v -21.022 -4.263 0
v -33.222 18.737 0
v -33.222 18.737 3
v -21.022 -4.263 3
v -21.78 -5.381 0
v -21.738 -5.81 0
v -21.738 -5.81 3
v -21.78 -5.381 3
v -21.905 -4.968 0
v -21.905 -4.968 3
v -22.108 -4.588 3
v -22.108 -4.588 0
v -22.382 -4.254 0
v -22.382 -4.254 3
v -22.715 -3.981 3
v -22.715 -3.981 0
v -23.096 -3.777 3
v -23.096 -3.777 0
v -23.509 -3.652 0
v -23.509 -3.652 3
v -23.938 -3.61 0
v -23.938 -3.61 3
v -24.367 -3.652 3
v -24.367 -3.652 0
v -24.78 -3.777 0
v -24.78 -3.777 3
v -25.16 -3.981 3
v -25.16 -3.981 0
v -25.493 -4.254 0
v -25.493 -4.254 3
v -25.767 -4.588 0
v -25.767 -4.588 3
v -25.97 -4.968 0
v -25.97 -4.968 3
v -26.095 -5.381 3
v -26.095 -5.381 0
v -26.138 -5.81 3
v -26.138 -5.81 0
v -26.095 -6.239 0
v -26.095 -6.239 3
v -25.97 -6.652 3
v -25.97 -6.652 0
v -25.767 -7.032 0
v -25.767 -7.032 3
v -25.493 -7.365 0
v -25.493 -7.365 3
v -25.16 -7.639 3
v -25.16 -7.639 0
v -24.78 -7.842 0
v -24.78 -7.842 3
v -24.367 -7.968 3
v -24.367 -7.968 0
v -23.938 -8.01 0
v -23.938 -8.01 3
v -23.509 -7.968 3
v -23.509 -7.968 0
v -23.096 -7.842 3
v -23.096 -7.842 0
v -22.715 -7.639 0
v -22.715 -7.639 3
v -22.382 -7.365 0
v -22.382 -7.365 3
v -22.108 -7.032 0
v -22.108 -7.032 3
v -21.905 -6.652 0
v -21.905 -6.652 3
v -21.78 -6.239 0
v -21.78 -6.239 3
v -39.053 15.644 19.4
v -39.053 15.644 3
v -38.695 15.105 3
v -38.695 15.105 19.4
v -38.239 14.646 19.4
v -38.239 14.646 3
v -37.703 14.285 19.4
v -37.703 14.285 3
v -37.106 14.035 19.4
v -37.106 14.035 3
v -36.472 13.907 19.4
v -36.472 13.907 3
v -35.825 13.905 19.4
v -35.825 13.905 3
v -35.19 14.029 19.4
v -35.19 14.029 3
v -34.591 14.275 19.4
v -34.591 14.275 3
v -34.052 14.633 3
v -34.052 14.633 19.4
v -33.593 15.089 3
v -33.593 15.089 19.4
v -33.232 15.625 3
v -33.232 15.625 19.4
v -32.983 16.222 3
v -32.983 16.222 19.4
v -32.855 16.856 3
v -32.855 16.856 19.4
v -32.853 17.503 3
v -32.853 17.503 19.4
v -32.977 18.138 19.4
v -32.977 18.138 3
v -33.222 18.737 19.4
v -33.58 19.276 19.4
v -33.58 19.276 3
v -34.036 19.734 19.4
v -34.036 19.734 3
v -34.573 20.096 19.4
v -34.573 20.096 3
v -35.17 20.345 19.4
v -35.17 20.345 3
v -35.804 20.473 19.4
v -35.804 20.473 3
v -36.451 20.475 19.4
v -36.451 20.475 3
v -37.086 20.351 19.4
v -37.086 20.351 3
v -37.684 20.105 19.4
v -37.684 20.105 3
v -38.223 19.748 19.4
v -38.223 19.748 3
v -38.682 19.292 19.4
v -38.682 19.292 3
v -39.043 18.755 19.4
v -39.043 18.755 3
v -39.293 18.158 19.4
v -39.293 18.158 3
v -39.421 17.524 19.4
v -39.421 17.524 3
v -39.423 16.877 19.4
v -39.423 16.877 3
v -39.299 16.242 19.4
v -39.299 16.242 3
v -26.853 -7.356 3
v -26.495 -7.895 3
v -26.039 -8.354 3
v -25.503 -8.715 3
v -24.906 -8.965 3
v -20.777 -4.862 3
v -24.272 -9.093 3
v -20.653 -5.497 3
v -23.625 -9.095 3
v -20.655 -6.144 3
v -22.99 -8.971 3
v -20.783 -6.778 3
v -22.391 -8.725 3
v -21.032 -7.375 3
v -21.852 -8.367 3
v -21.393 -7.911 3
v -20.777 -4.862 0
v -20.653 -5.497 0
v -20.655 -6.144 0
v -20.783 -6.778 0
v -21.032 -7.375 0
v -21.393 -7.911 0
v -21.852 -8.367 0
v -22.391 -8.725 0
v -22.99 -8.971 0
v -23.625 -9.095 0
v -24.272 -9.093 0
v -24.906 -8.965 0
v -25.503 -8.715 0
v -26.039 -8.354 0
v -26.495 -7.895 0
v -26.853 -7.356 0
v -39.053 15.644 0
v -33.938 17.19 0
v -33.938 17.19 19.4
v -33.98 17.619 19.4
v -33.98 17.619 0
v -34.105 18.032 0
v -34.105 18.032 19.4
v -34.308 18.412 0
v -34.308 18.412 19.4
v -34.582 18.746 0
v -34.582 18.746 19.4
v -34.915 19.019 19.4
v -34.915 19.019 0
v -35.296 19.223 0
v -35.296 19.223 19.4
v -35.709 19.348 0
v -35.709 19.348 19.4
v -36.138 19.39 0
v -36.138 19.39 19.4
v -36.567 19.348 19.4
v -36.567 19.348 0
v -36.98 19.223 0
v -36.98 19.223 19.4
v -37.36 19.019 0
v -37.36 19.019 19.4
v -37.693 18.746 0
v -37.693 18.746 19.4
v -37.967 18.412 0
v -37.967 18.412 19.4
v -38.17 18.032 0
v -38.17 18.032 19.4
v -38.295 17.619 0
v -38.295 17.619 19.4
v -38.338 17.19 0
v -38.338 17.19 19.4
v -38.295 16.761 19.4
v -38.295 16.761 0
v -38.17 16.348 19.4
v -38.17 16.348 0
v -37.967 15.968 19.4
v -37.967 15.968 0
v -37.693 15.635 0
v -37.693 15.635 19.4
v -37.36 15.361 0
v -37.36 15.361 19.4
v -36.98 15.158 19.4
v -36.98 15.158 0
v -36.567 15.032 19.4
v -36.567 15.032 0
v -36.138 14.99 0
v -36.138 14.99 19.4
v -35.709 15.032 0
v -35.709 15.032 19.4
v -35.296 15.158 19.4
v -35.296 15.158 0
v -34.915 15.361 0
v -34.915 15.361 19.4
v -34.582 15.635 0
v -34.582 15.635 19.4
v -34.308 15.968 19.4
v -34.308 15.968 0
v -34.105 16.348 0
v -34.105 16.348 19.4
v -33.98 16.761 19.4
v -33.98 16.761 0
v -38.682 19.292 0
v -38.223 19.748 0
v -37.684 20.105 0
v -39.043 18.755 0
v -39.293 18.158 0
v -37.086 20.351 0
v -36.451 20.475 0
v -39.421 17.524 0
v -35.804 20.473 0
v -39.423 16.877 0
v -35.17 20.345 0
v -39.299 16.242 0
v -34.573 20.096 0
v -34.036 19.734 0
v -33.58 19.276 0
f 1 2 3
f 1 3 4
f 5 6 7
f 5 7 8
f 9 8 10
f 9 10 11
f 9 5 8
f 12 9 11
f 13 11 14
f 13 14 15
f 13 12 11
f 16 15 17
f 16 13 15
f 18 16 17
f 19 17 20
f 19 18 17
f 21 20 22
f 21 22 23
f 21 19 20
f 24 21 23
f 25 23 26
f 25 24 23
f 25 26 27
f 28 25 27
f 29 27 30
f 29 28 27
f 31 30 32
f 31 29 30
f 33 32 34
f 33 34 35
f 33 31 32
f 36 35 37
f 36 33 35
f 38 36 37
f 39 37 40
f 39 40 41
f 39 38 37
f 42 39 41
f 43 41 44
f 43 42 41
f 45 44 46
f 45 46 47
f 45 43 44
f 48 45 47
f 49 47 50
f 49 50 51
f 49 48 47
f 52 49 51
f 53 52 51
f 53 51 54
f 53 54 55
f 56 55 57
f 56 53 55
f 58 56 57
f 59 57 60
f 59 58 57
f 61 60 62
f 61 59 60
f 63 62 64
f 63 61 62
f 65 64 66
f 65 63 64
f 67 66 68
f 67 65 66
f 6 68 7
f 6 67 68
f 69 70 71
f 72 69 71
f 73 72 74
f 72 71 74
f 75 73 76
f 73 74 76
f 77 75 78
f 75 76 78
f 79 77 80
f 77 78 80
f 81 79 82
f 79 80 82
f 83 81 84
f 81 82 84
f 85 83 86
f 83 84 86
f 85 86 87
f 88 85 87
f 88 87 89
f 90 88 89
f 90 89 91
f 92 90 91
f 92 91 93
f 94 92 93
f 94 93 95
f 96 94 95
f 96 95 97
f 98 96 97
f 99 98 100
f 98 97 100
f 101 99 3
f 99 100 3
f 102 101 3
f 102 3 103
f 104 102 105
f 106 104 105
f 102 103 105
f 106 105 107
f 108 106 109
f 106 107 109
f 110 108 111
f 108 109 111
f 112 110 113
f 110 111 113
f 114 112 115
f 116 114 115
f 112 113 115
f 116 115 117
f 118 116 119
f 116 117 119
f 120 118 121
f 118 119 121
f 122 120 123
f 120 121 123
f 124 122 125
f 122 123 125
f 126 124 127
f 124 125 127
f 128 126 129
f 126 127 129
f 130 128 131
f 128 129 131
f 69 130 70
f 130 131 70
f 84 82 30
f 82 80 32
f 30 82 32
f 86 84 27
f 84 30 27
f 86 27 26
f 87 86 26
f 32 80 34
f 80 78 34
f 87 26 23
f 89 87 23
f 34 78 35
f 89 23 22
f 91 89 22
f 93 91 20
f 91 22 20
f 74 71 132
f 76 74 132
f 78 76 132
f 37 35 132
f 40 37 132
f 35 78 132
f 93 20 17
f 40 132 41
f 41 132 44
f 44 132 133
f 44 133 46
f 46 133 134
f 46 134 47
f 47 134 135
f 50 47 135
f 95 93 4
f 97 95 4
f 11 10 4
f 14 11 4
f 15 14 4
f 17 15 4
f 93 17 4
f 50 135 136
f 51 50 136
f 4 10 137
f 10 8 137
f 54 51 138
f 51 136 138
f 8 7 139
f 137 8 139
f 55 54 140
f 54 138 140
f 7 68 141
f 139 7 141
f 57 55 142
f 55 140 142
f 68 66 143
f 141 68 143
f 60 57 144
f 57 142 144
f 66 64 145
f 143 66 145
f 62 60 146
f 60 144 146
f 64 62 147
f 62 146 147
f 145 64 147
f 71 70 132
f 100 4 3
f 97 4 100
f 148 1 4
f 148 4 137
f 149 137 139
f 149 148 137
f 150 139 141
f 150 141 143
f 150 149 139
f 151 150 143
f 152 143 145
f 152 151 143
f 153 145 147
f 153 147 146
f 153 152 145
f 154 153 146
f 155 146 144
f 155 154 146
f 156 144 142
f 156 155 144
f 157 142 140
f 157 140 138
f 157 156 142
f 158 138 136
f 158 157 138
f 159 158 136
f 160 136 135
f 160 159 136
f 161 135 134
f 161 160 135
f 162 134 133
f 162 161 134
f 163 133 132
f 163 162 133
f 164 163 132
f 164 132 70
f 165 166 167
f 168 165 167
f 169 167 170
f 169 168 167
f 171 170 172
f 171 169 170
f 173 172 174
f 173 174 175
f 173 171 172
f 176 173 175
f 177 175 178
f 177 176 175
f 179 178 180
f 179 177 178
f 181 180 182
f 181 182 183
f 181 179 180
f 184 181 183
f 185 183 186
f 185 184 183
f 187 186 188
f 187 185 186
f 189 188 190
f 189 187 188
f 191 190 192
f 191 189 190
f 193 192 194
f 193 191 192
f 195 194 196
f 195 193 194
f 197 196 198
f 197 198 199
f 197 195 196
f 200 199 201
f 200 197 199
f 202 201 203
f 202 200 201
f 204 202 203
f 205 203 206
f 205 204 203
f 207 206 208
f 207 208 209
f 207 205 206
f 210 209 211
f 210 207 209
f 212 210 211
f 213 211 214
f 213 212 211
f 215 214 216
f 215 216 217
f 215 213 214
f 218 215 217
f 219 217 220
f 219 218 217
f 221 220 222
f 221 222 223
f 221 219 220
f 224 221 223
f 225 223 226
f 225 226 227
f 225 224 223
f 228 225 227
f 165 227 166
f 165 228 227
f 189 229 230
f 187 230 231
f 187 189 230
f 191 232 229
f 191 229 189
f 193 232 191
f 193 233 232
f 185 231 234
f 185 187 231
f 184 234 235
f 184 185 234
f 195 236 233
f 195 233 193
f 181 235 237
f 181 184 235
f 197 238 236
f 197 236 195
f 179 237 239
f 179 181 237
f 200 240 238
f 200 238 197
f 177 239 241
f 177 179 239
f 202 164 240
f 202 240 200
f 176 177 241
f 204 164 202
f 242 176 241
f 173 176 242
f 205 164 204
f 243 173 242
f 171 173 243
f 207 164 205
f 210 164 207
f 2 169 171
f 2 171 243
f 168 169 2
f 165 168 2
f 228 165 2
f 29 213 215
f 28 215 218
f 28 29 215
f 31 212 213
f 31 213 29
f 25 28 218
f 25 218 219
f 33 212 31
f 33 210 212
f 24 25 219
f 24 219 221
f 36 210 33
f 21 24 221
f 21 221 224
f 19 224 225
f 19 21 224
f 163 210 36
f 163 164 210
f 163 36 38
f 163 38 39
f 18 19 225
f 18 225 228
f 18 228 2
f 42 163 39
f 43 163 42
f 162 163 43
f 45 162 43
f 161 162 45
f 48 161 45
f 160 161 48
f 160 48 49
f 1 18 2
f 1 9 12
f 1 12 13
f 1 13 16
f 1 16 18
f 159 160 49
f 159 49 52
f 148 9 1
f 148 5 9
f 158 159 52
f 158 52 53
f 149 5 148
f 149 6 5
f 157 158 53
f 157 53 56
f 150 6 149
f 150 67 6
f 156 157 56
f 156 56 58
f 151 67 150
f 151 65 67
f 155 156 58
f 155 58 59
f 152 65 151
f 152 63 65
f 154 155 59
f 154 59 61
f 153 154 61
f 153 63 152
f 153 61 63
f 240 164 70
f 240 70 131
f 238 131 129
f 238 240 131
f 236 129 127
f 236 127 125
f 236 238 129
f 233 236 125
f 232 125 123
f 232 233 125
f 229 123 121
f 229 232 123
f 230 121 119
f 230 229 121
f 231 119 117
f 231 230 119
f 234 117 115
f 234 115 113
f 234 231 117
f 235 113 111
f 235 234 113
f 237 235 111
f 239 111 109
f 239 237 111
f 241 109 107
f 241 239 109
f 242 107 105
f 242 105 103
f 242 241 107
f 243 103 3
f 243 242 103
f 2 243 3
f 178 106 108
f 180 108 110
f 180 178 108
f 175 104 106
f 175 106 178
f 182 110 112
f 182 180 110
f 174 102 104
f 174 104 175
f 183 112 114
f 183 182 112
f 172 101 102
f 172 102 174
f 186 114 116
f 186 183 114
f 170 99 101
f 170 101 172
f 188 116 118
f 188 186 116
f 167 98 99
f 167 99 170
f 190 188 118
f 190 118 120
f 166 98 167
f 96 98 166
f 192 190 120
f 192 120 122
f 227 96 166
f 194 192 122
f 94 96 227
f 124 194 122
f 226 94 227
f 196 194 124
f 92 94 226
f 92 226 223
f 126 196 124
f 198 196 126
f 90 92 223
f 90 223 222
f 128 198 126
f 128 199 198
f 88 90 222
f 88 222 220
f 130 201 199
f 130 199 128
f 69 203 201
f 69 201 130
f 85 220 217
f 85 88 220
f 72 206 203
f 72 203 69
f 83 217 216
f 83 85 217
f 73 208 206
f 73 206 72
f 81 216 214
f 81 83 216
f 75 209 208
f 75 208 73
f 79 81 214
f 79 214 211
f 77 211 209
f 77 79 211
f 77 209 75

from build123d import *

# Parameters (mm, degrees)
SKETCH1_R           = 2.2
BOSS_EXTRUDE1_DEPTH = 3
SKETCH2_R           = 3.3
SKETCH2_R_2         = 2.2
BOSS_EXTRUDE2_DEPTH = 16.4


with BuildPart() as part:
    # Sketch1 → Boss-Extrude1 (new body)
    with BuildSketch(Plane(origin=(0, 0, 0), x_dir=(-1, 0, 0), z_dir=(0, 0, 1))):
        with BuildLine():
            Line((26.852970862, 7.356194523), (39.052970862, -15.643805477))
            ThreePointArc((39.052970862, -15.643805477), (37.684063375, -20.105429878), (33.222438974, -18.736522391))
            Line((33.222438974, -18.736522391), (21.022438974, 4.263477609))
            ThreePointArc((21.022438974, 4.263477609), (22.391346461, 8.725102009), (26.852970862, 7.356194523))
        make_face()
        with Locations(Location((23.937704918, 5.809836066, 0), (0, 0, 180))):
            Circle(SKETCH1_R, mode=Mode.SUBTRACT)
        with Locations(Location((36.137704918, -17.190163934, 0), (0, 0, 180))):
            Circle(SKETCH1_R, mode=Mode.SUBTRACT)
    extrude(amount=BOSS_EXTRUDE1_DEPTH)

    # Sketch2 → Boss-Extrude2 (add)
    with BuildSketch(Plane.XY.offset(3)):
        with Locations(Location((-36.137704918, 17.190163934, 0), (0, 0, 207.943034423))):
            Circle(SKETCH2_R)
        with Locations((-36.137704918, 17.190163934)):
            Circle(SKETCH2_R_2, mode=Mode.SUBTRACT)
    extrude(amount=BOSS_EXTRUDE2_DEPTH)


solid = part.part
